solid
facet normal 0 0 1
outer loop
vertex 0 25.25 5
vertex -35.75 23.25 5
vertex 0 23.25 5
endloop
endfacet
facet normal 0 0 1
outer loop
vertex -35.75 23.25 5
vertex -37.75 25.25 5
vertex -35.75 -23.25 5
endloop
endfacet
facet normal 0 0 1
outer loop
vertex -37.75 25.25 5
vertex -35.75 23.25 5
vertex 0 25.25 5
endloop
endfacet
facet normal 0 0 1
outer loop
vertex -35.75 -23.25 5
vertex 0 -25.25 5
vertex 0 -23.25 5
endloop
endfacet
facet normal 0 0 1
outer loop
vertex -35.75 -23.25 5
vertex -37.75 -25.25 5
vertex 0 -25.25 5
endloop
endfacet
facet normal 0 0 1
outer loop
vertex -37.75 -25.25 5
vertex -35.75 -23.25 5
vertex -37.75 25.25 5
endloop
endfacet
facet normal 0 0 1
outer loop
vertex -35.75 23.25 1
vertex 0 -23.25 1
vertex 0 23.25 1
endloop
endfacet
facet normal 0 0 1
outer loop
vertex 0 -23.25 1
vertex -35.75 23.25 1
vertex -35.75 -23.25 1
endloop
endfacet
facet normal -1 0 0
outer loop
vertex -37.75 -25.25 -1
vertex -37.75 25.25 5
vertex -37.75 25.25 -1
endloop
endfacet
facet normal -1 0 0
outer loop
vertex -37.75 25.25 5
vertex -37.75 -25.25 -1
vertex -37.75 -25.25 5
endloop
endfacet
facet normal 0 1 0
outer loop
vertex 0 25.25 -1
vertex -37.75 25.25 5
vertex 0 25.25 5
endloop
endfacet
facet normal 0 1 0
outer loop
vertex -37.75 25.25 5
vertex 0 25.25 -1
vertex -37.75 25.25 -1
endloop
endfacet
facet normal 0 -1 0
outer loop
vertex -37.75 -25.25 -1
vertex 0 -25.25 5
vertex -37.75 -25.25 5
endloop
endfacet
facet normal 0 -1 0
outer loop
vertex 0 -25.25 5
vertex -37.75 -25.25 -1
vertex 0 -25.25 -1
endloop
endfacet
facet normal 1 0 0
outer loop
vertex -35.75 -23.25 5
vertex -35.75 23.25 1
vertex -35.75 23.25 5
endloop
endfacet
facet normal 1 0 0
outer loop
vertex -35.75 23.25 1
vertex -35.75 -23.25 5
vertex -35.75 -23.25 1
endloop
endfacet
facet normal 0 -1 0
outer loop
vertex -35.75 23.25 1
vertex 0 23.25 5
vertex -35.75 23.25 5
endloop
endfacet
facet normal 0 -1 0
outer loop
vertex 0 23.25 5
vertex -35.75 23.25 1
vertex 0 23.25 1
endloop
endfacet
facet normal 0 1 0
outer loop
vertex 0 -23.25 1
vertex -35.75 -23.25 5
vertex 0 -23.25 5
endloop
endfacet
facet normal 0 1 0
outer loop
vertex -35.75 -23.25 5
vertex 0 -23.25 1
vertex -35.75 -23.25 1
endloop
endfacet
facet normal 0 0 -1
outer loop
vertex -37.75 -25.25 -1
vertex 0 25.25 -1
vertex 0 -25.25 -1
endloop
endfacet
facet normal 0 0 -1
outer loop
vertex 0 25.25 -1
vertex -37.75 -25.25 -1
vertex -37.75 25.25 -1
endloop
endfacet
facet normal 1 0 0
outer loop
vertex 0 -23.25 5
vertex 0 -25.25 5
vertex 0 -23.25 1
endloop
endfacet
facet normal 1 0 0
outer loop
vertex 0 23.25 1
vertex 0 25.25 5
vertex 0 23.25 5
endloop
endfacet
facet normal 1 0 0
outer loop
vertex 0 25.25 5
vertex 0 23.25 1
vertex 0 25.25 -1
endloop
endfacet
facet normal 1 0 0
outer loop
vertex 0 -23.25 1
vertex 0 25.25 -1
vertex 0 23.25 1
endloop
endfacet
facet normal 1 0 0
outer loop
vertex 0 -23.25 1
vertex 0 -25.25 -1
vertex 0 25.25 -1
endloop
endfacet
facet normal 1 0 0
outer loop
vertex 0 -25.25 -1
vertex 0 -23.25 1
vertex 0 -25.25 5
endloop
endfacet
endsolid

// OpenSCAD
echo("Работа Огорельцева Тимура");

d_akkum = 18;
h_akkum = 65;
d_wires = 1.2;

thickness_frame = 4;
thickness_walls = 2;
thickness_bottom = 2;

w_back =70;
h_back = 45;
thickness_back = 1;
h_walls = 4;
gap_backlight = 1.5;

difference() {
    kit_frame();
    translate([w_back/2, 0, h_walls-thickness_bottom])
    cube([w_back, h_back+2*thickness_walls+2, 2*h_walls], center=true);
}

module kit_frame() {
    bottom();
    // color("green")
    translate([0, 0, h_walls/2+thickness_bottom/2])
    walls();
    wires();
}

module wires() {
    translate([w_back/2, -h_back/2+2, h_walls/2+0.5])
    rotate([0, 90, 0])
    color("red")
    cylinder(d=d_wires, h=25, center=true, $fn=32);

    translate([w_back/2, -h_back/2+6, h_walls/2+0.5])
    rotate([0, 90, 0])
    color("black")
    cylinder(d=d_wires, h=25, center=true, $fn=32);
}


module walls() {
    difference() {
        cube([w_back+2*thickness_walls+gap_backlight, h_back+2*thickness_walls+gap_backlight, h_walls], center=true);
        color("red")
        cube([w_back+gap_backlight, h_back+gap_backlight, h_walls+1], center=true);
    }
}

module bottom() {
    cube([w_back+2*thickness_walls+gap_backlight, h_back+2*thickness_walls+gap_backlight, thickness_bottom], center=true);
}
